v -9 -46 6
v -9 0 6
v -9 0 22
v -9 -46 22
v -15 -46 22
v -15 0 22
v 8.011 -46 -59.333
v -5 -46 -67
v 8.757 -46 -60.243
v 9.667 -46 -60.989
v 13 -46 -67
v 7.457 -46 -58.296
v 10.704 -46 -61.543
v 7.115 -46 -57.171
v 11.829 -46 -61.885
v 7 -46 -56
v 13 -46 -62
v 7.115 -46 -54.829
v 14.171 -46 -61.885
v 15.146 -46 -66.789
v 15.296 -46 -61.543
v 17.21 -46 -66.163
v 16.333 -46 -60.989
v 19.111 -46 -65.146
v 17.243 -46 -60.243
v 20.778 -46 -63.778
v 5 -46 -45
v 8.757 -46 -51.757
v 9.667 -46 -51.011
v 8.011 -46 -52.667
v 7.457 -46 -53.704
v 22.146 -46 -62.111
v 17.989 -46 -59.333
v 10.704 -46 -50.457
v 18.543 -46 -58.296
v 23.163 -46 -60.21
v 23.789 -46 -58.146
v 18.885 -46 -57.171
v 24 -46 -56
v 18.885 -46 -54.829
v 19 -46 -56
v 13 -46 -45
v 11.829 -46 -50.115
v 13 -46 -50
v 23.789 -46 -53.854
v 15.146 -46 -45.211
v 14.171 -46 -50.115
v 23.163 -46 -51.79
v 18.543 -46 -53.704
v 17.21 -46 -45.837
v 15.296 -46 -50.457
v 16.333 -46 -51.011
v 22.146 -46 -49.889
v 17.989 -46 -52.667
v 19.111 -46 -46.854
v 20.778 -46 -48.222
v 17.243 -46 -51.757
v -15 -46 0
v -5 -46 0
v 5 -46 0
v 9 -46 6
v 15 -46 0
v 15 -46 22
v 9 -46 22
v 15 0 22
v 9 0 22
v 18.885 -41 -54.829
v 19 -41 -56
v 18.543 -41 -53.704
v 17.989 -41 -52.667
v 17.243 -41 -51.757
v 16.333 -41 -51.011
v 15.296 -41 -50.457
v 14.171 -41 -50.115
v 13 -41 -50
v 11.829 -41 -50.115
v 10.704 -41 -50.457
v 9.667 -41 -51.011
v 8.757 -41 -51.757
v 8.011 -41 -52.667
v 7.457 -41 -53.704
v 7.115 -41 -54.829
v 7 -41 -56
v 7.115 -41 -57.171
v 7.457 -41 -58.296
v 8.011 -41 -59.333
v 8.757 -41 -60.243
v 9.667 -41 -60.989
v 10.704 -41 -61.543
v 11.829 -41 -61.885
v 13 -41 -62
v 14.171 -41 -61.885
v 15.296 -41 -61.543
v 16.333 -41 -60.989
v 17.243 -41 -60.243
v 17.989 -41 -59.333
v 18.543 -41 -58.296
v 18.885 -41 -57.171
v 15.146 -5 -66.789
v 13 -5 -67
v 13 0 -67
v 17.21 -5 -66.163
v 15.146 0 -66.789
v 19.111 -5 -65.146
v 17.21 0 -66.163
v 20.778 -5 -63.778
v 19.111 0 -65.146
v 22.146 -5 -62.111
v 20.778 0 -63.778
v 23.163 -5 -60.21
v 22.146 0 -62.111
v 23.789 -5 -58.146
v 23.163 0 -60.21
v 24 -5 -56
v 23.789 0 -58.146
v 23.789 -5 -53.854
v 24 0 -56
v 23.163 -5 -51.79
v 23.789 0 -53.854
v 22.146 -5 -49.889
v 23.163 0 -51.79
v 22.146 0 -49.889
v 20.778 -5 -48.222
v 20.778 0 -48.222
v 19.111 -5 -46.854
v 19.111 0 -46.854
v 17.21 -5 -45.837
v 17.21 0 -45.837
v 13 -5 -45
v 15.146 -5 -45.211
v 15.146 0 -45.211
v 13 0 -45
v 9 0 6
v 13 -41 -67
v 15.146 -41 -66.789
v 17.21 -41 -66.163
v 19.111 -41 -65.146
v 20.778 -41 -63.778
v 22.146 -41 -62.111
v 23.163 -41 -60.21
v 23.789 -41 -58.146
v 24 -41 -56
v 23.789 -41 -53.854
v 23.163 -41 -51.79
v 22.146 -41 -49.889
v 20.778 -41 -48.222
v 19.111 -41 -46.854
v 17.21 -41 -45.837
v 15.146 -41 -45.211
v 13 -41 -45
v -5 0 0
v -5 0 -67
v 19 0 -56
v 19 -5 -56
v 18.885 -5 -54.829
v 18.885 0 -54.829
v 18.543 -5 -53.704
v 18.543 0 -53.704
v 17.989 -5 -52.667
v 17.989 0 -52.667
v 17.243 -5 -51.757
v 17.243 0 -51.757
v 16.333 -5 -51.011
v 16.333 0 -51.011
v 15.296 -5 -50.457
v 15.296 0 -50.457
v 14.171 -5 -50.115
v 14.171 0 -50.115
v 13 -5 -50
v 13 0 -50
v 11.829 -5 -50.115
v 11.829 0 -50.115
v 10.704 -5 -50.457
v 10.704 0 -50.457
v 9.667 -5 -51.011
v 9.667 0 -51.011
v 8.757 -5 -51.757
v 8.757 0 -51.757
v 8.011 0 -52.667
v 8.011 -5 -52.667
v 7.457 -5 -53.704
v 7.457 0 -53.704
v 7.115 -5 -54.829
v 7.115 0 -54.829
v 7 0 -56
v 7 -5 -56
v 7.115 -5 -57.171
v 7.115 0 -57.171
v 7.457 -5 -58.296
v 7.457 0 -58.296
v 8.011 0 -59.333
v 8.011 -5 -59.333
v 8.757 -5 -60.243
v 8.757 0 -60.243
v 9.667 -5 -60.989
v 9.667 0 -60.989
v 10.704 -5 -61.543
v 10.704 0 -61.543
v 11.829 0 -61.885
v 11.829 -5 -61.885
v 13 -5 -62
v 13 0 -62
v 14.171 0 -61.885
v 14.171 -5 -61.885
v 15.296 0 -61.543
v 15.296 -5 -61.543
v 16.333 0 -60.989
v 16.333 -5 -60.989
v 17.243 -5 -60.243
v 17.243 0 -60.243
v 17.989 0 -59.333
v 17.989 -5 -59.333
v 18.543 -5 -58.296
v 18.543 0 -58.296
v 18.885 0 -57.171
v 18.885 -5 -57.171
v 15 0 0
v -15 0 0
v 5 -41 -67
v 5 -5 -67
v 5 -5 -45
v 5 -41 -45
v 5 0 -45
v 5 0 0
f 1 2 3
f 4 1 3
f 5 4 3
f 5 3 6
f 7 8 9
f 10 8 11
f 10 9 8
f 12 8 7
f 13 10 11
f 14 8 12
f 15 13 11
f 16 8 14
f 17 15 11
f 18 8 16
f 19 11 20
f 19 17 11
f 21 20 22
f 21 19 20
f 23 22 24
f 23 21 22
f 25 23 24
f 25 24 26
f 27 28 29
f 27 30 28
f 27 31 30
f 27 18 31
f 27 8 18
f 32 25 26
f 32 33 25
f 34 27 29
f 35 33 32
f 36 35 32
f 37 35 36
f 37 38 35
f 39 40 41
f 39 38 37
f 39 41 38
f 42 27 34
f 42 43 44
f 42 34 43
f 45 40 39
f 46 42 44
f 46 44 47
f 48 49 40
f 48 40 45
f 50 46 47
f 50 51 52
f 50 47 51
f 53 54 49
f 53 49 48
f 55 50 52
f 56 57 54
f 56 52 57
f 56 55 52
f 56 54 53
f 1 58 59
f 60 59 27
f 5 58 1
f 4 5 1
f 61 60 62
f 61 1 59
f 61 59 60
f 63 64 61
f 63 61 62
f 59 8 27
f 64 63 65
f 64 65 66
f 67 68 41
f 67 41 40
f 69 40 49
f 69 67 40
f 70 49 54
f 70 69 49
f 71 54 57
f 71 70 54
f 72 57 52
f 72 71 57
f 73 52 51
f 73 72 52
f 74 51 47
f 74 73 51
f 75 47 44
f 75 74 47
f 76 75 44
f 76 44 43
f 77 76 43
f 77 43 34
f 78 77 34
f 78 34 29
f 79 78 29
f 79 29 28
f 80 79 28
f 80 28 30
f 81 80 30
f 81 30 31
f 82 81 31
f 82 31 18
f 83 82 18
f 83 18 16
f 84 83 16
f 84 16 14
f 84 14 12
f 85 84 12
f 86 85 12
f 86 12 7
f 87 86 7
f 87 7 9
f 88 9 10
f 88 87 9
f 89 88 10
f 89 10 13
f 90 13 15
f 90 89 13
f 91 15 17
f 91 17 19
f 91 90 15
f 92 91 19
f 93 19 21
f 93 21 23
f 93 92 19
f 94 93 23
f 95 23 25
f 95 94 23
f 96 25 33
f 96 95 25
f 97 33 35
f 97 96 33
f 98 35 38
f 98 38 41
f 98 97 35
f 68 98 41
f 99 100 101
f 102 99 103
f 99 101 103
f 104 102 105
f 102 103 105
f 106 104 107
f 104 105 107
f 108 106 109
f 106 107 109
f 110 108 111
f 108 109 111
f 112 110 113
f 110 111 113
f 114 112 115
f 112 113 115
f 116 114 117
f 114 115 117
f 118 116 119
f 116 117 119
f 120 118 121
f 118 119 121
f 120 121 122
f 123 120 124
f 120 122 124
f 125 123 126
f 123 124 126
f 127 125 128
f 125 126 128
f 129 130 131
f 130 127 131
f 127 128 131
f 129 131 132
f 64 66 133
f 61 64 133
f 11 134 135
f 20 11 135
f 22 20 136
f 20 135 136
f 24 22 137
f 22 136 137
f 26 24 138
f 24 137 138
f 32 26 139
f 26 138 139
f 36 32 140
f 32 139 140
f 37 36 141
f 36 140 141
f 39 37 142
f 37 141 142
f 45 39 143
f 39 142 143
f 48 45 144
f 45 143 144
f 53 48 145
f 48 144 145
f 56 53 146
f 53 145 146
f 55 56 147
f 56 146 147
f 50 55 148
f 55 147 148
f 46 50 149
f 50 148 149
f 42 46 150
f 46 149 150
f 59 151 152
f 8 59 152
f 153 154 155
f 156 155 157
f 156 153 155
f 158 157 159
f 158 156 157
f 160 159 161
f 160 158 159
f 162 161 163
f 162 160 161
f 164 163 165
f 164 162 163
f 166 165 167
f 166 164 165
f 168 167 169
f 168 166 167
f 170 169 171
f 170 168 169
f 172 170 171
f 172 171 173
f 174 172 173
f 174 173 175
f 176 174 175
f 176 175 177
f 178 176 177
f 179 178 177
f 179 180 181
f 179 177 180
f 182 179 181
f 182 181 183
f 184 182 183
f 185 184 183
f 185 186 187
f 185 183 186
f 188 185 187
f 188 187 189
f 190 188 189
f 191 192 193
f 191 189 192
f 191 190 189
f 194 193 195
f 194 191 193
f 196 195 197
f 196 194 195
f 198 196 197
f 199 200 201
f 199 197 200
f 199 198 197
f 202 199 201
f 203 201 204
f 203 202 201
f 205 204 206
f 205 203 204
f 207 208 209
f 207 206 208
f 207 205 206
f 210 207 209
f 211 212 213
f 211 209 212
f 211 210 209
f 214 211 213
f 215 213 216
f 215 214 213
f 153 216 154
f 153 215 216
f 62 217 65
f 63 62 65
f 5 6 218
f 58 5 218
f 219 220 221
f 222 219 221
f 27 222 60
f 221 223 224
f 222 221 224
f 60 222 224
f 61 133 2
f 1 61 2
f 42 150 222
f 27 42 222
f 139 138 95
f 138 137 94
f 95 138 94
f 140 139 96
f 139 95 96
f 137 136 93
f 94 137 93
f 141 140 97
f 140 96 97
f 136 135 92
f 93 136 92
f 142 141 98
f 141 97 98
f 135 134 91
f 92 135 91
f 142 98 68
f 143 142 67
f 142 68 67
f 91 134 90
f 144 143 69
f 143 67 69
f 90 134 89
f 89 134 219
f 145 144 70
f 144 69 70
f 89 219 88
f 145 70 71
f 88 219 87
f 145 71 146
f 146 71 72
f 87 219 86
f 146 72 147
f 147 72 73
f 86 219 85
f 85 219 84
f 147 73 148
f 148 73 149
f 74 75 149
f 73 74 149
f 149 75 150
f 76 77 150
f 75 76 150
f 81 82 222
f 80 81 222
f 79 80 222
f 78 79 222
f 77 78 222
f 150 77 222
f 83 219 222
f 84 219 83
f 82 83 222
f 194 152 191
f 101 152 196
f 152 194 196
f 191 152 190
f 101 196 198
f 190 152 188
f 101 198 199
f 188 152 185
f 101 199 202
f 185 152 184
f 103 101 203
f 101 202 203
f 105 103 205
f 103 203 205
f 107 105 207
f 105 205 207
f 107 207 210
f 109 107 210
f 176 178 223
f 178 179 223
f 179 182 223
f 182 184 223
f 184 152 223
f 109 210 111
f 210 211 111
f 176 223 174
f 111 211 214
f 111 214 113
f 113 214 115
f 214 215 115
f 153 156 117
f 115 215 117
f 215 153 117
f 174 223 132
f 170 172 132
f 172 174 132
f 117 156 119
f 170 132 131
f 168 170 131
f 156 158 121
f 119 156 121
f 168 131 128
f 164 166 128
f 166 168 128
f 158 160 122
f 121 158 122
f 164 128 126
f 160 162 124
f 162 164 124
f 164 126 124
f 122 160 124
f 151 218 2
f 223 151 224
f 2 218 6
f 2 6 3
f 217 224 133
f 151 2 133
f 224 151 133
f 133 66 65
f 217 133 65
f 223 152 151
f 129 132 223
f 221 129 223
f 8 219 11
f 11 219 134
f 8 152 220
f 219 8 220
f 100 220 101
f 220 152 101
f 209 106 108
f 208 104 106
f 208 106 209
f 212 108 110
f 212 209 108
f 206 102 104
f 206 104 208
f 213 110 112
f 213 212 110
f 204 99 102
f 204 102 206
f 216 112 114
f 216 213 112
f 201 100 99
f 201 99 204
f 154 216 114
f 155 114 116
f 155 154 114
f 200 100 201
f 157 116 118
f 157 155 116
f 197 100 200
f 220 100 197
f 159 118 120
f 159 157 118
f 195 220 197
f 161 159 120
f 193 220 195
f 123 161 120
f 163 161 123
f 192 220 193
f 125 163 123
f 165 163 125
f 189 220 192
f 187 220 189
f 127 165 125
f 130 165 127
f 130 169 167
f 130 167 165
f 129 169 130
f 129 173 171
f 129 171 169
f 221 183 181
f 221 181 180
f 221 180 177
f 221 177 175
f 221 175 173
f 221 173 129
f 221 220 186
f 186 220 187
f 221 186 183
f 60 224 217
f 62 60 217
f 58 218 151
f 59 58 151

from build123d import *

# Parameters (mm, degrees)
F0_R     = 6
F1_DEPTH = 46
F2_W     = 36
F2_H     = 28.489591
F3_DEPTH = 25


with BuildPart() as f1:
    # F0 (on Front) → F1 (new body)
    with BuildSketch(Plane.XZ):
        with BuildLine():
            Line((5, -45), (5, 0))
            Line((5, 0), (15, 0))
            Line((15, 0), (15, 22))
            Line((15, 22), (9, 22))
            Line((9, 22), (9, 6))
            Line((9, 6), (0, 6))
            Line((0, 6), (-9, 6))
            Line((-9, 6), (-9, 22))
            Line((-9, 22), (-15, 22))
            Line((-15, 22), (-15, 0))
            Line((-15, 0), (-5, 0))
            Line((-5, 0), (-5, -67))
            Line((-5, -67), (5, -67))
            Line((5, -67), (13, -67))
            ThreePointArc((13, -67), (24, -56), (13, -45))
            Line((13, -45), (5, -45))
        make_face()
        with Locations((13, -56)):
            Circle(F0_R, mode=Mode.SUBTRACT)
    extrude(amount=F1_DEPTH)


with BuildPart() as f3:
    # F2 (on face) → F3 (new body)
    with BuildSketch(Plane.YZ.offset(5)):
        with Locations((-23, -59.244795)):
            Rectangle(F2_W, F2_H)
    extrude(amount=F3_DEPTH)


with BuildPart() as f1_1:
    add(f1.part)

    # F4: cut F3
    add(f3.part, mode=Mode.SUBTRACT)


solid = f1_1.part
